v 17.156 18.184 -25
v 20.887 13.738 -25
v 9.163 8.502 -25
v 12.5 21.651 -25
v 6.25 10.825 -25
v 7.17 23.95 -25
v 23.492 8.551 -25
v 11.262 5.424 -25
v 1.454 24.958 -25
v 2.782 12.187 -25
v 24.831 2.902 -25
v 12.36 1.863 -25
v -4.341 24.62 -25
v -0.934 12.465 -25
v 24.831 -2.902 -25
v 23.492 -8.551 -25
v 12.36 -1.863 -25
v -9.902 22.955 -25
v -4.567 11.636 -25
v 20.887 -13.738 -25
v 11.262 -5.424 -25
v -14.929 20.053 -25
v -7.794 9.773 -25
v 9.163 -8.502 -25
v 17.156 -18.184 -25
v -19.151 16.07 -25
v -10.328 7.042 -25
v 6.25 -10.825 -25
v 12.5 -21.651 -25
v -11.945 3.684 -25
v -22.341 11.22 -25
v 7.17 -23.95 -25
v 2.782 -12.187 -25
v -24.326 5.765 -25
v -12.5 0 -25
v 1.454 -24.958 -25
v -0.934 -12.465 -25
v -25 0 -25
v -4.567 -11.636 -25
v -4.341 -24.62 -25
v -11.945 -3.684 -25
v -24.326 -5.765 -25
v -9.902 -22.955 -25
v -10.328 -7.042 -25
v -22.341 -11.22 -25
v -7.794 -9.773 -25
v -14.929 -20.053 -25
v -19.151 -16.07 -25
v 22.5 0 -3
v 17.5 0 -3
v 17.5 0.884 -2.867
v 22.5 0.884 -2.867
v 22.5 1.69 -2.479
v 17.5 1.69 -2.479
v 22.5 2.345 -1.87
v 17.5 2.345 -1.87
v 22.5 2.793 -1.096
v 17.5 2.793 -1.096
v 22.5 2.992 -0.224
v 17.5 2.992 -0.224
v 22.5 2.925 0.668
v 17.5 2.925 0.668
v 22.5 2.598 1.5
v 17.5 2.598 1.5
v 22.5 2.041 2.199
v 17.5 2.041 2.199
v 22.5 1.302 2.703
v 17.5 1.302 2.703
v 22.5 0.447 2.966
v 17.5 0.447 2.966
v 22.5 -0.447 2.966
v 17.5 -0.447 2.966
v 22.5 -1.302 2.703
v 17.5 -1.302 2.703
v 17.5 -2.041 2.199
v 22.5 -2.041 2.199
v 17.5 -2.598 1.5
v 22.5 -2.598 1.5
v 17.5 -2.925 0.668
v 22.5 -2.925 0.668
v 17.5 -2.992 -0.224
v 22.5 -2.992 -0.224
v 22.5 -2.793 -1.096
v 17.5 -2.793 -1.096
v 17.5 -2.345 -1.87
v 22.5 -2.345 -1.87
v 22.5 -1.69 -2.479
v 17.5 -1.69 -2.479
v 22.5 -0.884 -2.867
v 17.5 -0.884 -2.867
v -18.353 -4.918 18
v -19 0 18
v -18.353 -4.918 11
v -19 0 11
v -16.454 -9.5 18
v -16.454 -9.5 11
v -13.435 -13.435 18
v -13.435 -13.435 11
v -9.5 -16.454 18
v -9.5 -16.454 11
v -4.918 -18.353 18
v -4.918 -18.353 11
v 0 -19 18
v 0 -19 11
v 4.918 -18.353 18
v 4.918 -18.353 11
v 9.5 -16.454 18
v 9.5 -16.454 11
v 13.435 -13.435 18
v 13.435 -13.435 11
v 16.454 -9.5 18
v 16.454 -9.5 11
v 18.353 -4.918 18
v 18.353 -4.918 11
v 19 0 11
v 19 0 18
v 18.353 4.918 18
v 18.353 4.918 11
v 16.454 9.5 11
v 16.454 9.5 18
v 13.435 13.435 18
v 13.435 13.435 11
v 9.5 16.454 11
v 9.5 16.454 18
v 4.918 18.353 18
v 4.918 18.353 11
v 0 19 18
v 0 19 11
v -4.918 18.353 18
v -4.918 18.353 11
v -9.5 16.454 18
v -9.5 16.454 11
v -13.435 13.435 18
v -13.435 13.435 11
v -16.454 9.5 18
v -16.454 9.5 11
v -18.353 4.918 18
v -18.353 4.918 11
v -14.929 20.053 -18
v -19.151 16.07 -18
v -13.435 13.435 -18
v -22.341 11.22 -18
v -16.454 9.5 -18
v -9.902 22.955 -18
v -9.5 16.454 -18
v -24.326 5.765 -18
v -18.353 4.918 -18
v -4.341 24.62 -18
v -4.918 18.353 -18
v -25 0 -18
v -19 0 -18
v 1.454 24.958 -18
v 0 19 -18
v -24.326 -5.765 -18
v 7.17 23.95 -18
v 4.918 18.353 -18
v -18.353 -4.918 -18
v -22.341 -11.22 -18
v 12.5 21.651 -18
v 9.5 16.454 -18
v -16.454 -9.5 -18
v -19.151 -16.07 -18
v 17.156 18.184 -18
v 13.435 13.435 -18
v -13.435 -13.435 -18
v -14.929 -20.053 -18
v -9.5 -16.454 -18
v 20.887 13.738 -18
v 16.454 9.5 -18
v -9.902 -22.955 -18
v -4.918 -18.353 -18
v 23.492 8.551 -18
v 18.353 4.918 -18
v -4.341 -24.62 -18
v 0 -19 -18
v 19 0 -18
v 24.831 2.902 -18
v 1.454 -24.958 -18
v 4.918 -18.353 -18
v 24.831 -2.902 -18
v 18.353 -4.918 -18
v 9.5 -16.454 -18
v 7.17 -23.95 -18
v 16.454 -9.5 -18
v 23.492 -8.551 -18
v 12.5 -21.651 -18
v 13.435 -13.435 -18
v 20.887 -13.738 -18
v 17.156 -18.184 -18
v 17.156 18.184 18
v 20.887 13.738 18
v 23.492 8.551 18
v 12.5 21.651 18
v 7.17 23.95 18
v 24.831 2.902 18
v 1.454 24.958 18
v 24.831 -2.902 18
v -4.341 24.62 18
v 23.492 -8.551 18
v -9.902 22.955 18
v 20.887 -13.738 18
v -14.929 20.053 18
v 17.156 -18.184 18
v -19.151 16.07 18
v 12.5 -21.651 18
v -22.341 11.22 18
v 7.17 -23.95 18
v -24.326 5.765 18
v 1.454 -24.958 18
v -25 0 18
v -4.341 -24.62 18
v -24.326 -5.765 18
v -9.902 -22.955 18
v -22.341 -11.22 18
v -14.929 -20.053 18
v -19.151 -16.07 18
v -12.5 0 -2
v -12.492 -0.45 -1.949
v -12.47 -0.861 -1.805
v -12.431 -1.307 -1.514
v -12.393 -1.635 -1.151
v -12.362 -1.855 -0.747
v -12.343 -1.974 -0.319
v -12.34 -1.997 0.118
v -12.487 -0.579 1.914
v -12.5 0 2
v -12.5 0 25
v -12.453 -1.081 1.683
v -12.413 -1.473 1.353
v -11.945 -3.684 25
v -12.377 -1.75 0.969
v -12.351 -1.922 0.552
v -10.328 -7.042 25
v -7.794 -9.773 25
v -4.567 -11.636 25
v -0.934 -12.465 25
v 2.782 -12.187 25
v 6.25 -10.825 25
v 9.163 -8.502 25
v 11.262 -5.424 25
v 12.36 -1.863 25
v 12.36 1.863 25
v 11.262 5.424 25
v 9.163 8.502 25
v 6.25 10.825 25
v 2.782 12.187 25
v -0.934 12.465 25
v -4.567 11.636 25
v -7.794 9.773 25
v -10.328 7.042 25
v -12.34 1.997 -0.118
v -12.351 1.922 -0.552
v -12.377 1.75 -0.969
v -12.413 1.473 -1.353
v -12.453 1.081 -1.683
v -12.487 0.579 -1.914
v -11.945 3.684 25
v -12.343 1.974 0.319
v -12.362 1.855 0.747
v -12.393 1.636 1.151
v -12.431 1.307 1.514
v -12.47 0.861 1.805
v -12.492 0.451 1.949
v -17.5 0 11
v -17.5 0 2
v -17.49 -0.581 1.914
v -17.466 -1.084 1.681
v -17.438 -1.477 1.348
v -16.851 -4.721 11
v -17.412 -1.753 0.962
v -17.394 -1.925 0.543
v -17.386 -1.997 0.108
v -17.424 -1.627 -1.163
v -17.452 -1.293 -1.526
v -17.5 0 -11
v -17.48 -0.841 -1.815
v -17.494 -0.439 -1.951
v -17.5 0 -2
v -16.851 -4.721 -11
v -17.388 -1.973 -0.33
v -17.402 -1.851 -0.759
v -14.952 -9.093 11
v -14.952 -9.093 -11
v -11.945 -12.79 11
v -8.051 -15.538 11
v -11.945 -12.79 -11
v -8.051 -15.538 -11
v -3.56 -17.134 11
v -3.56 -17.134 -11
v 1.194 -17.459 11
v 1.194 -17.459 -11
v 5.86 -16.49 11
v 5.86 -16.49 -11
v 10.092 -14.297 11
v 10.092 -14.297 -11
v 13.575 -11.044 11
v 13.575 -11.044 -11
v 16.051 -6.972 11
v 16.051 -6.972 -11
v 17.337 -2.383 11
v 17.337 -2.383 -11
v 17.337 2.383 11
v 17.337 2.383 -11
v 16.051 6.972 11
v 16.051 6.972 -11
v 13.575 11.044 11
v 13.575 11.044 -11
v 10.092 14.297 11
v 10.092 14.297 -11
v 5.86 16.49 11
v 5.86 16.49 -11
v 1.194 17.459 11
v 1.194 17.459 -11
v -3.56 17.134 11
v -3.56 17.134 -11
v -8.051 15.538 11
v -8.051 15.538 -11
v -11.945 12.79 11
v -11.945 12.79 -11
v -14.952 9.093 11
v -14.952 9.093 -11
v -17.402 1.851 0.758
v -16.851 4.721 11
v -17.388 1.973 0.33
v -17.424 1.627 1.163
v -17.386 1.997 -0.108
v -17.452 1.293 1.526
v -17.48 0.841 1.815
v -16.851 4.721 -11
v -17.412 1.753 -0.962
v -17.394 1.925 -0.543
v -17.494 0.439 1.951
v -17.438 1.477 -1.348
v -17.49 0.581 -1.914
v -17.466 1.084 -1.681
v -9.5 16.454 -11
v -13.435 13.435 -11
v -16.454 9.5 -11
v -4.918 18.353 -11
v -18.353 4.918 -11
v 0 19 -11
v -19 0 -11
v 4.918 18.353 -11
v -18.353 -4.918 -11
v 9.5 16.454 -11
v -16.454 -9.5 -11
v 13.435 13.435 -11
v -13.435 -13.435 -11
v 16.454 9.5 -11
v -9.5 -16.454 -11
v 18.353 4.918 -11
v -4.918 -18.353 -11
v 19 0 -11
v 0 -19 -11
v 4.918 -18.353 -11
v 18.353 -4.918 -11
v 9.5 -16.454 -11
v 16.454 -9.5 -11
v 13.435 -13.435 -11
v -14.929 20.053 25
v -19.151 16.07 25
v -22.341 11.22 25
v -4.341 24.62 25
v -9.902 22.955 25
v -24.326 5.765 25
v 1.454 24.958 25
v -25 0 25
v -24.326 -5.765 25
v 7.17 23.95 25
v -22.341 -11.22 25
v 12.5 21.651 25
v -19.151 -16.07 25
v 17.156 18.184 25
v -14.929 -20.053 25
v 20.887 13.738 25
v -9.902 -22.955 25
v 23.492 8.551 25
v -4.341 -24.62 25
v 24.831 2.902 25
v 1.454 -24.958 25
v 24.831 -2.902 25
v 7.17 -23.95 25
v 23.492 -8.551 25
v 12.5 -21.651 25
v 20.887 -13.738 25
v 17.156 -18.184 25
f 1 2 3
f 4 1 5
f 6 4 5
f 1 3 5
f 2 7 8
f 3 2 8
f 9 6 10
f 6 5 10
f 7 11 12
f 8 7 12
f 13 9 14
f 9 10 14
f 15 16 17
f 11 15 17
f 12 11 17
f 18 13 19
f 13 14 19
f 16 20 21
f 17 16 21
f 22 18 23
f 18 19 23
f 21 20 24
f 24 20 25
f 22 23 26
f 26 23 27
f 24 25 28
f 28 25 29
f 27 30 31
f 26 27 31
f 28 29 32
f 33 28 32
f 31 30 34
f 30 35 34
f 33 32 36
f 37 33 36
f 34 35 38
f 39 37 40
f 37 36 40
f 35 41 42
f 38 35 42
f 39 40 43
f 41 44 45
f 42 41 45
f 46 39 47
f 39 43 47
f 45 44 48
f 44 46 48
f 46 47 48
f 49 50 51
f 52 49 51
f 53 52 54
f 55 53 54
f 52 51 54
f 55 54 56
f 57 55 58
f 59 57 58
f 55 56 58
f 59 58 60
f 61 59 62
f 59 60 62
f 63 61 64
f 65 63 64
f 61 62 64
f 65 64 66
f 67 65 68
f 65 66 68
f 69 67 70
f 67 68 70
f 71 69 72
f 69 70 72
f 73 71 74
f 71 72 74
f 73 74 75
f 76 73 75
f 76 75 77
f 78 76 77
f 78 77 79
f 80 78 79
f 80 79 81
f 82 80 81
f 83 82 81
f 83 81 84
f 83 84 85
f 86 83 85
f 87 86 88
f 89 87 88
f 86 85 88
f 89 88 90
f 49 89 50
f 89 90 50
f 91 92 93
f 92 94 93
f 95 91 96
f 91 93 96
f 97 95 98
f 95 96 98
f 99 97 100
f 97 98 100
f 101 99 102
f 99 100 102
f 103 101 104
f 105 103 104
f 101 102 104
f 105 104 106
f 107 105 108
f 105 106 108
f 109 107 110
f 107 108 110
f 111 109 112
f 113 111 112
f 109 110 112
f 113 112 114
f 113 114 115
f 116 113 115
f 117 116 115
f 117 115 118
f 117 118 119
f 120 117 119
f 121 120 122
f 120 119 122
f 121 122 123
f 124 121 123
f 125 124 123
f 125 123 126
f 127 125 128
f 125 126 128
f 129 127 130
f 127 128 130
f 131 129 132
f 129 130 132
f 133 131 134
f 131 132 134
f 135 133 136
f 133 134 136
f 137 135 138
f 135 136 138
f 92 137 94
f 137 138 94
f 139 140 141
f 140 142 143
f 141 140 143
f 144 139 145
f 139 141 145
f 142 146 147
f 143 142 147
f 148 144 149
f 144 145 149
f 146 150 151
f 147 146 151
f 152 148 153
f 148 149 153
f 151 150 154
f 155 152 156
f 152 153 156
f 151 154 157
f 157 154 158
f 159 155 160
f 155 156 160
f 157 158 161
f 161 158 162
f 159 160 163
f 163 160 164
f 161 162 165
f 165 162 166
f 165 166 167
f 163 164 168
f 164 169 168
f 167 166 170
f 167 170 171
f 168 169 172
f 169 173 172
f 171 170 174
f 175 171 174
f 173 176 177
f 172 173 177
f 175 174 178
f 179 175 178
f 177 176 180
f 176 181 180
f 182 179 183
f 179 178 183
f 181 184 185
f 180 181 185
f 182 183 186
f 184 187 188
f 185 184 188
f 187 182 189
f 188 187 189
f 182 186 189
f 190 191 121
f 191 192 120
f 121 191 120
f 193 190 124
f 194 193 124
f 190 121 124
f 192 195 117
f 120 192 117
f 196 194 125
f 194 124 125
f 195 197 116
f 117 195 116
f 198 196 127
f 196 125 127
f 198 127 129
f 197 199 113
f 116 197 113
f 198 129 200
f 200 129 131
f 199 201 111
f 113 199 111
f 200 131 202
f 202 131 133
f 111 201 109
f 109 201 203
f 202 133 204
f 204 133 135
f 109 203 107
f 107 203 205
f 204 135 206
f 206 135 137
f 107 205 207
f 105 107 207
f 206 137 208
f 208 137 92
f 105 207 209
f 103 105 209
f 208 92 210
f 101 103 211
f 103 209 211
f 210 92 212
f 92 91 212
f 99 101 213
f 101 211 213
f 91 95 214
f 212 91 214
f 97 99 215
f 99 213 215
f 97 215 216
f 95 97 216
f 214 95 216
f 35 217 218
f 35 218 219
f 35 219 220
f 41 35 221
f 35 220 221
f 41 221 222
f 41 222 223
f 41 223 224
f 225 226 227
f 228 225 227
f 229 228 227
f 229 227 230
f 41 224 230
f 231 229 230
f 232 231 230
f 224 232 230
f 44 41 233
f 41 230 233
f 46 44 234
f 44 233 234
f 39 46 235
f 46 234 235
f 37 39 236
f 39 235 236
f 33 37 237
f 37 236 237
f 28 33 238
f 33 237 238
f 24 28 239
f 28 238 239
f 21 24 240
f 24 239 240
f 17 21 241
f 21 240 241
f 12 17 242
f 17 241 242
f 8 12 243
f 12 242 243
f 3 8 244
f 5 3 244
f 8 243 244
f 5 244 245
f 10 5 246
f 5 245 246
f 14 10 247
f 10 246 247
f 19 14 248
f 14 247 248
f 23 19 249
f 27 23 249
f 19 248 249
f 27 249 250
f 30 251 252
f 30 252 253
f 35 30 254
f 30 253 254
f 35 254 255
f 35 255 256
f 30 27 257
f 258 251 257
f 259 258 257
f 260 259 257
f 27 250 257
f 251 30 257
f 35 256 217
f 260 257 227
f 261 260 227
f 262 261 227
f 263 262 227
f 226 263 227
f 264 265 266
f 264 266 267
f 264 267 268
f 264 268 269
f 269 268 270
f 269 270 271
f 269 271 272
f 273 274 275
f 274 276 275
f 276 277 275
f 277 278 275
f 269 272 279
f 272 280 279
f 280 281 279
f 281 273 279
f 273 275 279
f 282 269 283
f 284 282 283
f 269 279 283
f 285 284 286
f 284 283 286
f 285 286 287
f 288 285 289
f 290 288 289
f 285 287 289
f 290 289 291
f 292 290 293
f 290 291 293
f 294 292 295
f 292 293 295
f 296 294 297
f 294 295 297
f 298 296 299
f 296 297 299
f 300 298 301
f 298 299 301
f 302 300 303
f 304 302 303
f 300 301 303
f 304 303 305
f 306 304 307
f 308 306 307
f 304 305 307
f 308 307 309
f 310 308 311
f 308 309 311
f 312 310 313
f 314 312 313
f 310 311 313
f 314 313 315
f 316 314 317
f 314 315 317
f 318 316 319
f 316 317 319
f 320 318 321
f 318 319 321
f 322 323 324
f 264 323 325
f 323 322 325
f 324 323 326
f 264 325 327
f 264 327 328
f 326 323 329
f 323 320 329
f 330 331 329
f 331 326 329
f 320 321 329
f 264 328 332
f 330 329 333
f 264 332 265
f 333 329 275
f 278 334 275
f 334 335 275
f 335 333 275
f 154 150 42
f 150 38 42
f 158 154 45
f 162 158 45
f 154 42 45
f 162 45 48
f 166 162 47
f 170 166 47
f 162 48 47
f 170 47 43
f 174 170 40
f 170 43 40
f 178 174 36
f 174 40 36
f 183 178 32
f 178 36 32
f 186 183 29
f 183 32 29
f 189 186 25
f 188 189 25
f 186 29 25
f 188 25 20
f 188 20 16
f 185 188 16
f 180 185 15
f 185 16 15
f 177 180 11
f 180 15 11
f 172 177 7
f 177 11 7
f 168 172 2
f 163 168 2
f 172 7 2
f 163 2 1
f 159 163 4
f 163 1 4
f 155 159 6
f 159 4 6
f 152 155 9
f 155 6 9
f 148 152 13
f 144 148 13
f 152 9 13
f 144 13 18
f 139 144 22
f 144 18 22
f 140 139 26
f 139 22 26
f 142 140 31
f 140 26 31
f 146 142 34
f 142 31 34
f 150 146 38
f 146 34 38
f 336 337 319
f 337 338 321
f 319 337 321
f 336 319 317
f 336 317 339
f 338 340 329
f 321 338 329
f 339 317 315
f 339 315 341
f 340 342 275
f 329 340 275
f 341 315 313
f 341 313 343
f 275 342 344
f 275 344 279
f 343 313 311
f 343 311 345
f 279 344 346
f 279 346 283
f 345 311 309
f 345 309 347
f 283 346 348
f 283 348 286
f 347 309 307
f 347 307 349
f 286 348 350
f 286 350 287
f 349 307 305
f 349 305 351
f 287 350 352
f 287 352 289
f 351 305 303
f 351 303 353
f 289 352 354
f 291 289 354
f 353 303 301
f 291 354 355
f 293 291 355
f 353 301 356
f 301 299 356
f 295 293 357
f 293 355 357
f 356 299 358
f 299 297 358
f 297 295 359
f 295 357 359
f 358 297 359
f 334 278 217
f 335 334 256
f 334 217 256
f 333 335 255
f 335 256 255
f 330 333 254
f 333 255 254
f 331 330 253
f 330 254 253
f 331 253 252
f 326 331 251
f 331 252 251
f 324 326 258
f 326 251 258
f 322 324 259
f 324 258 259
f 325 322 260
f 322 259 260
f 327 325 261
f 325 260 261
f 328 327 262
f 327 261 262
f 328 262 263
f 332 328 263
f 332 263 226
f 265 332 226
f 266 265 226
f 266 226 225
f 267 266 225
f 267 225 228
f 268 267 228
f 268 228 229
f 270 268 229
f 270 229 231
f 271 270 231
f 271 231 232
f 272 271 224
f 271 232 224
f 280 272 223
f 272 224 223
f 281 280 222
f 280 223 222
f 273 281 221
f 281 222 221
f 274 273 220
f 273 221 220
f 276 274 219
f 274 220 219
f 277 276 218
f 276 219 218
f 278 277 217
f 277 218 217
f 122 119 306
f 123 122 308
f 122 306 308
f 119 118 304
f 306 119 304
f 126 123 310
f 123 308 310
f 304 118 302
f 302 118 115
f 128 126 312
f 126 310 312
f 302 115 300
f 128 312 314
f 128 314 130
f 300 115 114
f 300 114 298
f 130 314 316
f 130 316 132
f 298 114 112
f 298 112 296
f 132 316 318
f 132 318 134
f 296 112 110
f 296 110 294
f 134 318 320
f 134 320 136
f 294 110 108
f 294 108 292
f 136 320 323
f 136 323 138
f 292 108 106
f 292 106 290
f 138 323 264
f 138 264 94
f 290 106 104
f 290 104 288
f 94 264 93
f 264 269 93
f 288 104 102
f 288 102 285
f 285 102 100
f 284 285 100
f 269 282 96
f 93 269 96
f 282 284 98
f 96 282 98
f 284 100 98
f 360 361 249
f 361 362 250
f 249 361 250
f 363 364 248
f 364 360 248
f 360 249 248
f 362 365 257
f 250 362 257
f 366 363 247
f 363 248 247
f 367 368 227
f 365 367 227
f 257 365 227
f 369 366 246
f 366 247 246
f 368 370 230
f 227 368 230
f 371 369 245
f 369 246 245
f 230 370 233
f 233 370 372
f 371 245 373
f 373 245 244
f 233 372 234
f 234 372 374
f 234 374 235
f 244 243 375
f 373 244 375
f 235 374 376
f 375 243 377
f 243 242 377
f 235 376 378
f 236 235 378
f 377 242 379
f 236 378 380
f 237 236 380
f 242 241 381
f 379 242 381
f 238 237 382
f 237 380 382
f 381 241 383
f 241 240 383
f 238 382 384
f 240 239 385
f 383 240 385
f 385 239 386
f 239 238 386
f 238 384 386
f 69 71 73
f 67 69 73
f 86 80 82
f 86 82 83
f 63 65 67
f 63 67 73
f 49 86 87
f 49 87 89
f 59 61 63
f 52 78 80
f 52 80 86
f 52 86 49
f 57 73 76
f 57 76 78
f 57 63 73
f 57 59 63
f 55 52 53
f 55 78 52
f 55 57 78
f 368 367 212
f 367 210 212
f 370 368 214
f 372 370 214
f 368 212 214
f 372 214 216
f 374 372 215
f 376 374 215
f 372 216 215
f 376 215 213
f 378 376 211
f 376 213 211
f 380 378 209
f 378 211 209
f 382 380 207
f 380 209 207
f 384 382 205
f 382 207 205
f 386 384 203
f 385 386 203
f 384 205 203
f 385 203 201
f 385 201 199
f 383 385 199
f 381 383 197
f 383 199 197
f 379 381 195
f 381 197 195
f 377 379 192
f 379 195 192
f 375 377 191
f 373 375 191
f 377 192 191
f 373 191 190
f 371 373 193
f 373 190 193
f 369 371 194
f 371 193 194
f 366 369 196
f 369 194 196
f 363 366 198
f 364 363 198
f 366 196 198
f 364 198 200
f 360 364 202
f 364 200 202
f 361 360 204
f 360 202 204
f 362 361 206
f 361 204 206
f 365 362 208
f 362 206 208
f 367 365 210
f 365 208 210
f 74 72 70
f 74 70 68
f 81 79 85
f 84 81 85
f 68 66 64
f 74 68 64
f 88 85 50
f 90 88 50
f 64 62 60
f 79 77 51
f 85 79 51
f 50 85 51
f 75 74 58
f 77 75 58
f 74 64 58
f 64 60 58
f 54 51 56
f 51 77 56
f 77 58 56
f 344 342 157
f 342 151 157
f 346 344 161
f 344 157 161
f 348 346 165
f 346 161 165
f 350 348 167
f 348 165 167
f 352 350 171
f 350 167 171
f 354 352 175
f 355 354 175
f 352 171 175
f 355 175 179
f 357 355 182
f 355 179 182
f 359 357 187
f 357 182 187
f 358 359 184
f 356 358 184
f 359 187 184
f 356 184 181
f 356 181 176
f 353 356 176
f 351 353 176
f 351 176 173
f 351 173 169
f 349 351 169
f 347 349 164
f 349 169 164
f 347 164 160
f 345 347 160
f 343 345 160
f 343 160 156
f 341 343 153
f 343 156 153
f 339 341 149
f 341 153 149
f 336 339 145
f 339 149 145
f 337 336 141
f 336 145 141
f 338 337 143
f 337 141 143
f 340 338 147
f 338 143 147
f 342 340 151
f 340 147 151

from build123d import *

# Parameters (mm, degrees)
SKETCH2_R           = 2
CUT_EXTRUDE2_DEPTH  = 78
SKETCH3_R           = 3
BOSS_EXTRUDE1_DEPTH = 5


with BuildPart() as part:
    # Sketch1 → Revolve1 (revolve)
    with BuildSketch(Plane(origin=(0, 0, 0), x_dir=(0, 0, -1), z_dir=(1, 0, 0)), mode=Mode.PRIVATE) as revolve1_sk:
        Polygon((-11, 19), (-11, 17.5), (11, 17.5), (11, 19), (18, 19), (18, 25), (25, 25), (25, 12.5), (-25, 12.5), (-25, 25), (-18, 25), (-18, 19), align=None)
    revolve(revolve1_sk.sketch.rotate(Axis((0, 0, -158.679414735), (0, 0, 1)), 90), axis=Axis((0, 0, -158.679414735), (0, 0, 1)))

    # Sketch2 → Cut-Extrude2 (cut)
    with BuildSketch(Plane(origin=(0, 0, 0), x_dir=(0, 0, -1), z_dir=(1, 0, 0))):
        Circle(SKETCH2_R)
    extrude(amount=-CUT_EXTRUDE2_DEPTH, mode=Mode.SUBTRACT)


with BuildPart() as body_2:
    # Sketch3 → Boss-Extrude1 (new body)
    with BuildSketch(Plane(origin=(17.5, 0, 0), x_dir=(0, 0, -1), z_dir=(1, 0, 0))):
        Circle(SKETCH3_R)
    extrude(amount=BOSS_EXTRUDE1_DEPTH)


solid = Compound([part.part, body_2.part])
